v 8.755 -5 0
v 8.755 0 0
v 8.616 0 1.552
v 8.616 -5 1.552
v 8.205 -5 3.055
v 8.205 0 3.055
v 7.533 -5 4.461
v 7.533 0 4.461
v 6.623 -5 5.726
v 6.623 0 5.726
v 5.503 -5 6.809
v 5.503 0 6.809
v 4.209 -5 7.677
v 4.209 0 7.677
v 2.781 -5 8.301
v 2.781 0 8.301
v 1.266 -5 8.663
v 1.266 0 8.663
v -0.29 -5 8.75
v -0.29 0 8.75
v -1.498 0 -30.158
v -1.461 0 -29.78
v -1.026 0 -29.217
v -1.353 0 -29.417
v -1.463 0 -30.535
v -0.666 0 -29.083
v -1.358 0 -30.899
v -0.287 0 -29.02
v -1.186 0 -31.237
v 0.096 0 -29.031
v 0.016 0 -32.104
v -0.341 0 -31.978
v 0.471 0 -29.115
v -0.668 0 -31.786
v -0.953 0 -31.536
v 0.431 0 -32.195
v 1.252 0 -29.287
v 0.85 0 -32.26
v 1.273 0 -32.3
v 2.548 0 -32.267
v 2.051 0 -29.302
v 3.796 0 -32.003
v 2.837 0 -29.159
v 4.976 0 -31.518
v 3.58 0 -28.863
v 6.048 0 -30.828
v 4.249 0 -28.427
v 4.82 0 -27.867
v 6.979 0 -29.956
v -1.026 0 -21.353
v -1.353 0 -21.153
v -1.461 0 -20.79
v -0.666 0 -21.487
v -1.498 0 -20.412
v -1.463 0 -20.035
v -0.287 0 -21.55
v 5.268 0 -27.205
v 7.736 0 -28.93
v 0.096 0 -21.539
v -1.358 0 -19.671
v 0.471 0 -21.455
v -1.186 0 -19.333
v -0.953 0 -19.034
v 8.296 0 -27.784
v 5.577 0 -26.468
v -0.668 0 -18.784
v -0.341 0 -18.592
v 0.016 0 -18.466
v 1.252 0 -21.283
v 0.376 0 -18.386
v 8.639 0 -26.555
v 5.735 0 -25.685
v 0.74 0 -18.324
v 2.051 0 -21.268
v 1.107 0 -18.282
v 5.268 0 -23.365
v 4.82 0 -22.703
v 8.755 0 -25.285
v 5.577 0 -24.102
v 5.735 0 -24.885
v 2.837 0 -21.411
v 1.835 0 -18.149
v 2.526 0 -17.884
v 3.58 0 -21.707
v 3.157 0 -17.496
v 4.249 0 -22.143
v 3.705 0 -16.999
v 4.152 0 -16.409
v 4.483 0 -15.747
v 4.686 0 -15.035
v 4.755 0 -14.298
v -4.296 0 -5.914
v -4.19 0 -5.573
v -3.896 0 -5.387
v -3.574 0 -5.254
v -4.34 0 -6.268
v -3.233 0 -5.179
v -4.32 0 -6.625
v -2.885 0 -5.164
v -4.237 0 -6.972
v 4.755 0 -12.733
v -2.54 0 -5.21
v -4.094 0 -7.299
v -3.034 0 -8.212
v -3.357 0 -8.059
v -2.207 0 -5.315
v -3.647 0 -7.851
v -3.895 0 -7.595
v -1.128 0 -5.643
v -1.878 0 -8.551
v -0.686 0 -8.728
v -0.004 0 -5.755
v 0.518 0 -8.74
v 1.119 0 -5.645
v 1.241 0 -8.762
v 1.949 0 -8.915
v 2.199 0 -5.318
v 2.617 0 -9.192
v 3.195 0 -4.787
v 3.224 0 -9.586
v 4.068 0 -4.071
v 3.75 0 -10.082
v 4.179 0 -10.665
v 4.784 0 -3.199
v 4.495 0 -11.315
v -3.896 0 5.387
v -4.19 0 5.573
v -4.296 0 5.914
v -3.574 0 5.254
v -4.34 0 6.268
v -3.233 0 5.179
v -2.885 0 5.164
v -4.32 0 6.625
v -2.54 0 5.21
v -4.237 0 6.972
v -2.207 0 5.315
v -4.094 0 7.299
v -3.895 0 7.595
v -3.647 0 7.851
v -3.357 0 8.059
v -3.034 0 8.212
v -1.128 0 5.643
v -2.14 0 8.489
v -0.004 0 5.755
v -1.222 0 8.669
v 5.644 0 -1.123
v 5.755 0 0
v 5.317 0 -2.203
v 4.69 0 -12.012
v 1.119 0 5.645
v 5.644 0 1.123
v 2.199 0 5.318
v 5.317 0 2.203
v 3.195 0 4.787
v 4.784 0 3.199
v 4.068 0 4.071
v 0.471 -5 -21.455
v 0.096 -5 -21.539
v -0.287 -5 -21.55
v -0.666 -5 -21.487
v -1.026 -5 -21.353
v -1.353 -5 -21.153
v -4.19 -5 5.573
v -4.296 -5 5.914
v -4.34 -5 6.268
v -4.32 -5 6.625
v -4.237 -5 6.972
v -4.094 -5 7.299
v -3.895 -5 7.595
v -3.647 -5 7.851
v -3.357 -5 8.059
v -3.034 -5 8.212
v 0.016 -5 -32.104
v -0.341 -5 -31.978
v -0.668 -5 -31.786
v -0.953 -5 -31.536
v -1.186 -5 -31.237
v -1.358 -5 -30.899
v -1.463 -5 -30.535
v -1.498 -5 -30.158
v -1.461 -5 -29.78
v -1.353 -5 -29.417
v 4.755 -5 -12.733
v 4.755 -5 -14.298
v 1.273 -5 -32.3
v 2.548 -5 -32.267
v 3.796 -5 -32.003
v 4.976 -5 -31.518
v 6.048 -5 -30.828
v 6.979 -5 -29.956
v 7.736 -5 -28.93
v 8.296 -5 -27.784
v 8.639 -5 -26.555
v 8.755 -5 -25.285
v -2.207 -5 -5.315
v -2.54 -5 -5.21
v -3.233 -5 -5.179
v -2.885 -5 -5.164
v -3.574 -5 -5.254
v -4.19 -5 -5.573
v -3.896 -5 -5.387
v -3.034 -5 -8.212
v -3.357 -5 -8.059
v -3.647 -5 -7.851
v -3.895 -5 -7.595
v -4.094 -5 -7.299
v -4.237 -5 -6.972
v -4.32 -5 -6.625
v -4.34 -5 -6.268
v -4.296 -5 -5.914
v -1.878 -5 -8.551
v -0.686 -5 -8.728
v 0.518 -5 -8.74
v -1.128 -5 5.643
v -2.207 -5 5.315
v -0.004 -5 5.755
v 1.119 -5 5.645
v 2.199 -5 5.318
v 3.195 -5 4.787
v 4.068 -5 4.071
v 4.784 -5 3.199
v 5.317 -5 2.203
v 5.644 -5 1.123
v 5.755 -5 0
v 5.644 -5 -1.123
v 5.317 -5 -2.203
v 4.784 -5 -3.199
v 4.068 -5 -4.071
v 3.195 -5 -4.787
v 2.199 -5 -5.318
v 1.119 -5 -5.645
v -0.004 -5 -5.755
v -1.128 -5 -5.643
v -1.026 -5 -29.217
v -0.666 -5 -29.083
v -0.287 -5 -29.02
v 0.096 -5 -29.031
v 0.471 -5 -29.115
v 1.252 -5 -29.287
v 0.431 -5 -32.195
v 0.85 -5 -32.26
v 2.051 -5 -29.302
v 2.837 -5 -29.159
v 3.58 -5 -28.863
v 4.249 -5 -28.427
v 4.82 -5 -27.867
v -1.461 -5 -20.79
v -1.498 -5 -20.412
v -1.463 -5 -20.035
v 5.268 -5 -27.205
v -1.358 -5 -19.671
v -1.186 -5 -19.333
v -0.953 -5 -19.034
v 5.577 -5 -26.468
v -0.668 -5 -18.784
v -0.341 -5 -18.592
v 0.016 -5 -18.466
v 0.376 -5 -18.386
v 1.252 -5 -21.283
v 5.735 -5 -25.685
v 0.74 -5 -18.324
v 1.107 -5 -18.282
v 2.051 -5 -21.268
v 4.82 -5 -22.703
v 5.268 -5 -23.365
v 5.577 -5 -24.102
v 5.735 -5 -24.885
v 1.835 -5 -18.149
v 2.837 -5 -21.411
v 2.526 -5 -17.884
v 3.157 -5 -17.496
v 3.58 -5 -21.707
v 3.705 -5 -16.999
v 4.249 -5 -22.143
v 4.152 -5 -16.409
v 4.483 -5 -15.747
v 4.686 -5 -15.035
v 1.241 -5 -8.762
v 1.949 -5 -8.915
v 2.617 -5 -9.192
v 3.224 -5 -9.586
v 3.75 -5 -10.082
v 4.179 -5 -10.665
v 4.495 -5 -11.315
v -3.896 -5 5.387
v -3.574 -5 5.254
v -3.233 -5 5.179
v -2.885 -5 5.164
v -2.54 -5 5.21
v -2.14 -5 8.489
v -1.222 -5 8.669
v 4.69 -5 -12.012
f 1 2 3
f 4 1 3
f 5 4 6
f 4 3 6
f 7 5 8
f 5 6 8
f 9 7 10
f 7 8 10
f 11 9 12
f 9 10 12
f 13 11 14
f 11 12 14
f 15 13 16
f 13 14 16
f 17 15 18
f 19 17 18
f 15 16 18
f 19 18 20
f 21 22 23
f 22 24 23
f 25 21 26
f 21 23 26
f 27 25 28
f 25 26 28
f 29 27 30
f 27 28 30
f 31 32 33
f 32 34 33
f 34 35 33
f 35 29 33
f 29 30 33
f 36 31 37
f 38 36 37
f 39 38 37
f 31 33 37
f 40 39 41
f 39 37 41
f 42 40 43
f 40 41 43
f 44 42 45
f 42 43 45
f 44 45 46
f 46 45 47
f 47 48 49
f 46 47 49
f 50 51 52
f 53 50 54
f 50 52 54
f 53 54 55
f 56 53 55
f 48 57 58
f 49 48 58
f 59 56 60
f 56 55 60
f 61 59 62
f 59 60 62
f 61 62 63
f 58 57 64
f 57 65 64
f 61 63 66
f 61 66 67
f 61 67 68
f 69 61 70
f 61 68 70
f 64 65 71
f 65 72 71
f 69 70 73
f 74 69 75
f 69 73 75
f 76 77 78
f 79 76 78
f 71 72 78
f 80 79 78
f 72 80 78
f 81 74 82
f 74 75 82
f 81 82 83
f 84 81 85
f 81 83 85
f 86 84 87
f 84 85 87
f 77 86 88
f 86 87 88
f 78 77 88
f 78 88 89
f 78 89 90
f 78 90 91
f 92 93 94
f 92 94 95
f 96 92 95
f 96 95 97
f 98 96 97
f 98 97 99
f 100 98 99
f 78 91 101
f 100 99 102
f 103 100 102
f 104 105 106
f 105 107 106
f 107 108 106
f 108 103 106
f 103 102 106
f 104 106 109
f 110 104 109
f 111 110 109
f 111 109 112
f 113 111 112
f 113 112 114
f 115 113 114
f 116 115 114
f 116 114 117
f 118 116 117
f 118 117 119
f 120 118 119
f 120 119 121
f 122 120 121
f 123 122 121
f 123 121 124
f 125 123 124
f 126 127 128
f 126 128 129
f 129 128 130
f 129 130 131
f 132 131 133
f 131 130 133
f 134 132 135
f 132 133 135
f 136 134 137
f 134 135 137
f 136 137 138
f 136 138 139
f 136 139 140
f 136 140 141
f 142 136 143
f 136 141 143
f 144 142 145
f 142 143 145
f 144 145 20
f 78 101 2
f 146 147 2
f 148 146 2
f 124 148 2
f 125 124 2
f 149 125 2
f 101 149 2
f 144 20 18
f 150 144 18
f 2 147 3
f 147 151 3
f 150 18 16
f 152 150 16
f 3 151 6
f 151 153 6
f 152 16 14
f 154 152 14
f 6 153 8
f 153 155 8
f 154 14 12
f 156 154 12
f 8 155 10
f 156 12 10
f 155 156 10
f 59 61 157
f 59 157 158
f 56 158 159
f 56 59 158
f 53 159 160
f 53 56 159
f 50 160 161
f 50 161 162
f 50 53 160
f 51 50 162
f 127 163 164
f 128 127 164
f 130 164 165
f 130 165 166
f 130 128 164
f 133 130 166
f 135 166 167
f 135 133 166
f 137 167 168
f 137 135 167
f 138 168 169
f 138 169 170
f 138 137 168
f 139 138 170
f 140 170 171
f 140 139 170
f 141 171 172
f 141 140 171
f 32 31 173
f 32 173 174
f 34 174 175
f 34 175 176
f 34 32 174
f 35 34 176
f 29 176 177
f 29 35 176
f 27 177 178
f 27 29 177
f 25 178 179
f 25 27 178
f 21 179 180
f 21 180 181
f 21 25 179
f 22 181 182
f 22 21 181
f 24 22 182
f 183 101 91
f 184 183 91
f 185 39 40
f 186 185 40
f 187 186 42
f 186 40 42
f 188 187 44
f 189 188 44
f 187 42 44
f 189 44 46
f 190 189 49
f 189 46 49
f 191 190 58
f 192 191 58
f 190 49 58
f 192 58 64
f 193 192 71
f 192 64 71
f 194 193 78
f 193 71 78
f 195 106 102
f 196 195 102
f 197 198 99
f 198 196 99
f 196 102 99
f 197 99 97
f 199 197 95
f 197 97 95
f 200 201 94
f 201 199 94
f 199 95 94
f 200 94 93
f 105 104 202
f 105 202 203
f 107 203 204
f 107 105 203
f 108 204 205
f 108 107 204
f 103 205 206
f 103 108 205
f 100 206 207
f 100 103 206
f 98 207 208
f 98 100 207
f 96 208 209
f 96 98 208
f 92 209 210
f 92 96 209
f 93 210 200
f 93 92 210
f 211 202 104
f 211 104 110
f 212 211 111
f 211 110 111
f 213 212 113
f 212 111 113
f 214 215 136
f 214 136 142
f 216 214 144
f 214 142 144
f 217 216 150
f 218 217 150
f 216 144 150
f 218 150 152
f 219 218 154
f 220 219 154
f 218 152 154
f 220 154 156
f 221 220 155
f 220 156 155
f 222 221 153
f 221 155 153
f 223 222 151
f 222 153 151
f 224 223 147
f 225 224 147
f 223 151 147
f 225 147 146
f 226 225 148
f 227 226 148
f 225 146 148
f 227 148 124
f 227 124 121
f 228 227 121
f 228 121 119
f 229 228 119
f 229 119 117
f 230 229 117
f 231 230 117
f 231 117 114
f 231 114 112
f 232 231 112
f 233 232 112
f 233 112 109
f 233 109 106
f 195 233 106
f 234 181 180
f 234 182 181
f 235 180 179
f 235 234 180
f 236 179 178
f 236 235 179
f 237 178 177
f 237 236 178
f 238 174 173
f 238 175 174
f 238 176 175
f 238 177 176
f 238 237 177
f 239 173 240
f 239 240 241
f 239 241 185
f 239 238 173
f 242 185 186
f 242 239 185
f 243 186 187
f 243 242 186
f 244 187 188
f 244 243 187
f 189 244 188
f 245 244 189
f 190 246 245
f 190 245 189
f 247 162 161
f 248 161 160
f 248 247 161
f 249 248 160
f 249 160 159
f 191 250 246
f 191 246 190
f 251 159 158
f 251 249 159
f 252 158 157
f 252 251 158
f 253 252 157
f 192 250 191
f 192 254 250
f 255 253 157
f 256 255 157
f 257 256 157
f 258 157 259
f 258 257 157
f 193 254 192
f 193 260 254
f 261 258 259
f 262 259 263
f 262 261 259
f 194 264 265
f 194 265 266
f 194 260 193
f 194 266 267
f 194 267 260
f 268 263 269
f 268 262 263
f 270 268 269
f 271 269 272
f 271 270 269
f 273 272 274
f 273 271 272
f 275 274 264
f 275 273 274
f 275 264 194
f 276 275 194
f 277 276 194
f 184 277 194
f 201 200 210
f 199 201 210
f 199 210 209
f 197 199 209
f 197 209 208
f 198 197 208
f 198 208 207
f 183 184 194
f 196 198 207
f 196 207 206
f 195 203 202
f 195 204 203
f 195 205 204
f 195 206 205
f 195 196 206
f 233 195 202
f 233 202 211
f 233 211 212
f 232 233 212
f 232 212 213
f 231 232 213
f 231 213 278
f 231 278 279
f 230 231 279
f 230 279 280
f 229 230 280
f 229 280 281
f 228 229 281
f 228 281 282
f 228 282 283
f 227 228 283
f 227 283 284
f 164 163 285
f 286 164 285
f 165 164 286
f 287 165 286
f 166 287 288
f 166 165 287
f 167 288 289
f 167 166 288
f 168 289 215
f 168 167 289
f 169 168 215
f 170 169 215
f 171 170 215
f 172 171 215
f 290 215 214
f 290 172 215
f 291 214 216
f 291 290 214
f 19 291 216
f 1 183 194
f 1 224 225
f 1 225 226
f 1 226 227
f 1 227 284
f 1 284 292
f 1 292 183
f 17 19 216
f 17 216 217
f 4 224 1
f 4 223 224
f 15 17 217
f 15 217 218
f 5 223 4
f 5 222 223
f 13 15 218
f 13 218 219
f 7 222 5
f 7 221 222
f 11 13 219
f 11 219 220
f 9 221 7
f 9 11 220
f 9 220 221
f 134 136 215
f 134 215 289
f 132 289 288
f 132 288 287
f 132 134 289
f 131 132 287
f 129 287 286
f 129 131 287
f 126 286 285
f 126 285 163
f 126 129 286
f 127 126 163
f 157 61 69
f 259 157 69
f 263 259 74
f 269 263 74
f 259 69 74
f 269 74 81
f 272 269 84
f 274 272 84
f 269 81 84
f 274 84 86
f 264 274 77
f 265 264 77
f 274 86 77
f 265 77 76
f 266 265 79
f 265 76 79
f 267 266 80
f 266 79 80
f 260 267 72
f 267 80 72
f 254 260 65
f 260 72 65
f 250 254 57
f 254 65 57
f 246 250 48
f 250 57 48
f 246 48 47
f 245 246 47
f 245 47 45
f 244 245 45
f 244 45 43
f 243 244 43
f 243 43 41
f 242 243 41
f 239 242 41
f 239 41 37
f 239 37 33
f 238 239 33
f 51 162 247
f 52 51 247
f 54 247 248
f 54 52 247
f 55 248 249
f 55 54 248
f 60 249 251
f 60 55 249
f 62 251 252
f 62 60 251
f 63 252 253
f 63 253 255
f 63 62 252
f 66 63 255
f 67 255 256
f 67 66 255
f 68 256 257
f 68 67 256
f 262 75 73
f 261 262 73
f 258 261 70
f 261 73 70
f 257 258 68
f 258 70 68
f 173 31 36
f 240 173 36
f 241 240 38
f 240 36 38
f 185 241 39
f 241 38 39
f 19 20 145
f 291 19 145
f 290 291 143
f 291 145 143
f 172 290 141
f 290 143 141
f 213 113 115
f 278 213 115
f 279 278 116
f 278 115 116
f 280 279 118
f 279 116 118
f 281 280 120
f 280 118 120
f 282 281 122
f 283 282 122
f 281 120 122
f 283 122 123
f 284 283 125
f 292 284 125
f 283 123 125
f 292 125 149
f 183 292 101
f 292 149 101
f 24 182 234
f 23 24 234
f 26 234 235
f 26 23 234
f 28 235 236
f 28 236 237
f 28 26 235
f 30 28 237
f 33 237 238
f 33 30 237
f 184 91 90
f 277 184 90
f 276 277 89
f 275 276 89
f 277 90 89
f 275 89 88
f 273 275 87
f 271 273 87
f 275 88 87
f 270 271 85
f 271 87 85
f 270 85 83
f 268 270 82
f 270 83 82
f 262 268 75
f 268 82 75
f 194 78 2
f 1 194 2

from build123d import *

# Parameters (mm, degrees)
F1_DEPTH    = 5
F2_T1_DEPTH = 18.1085359619
F2_T3_DEPTH = 13.6883237314
F2_T5_DEPTH = 19.2734411819
F2_T7_DEPTH = 13.2933208328


# Not quite as in the source:
# - a fillet or chamfer that OpenCascade refuses, or shapes differently, is made with other operations: its cross-section is extruded or revolved along the edge and cut away or added


with BuildPart() as f1:
    # F0 (on Front) → F1 (new body)
    with BuildSketch(Plane.XZ):
        with BuildLine():
            Line((8.755, -25.285), (8.755, 0))
            ThreePointArc((8.755, 0), (6.0873467679, 6.2923949596), (-0.2899421651, 8.7501976287))
            ThreePointArc((-0.2899421651, 8.7501976287), (-2.9511128894, 8.2426305094), (-5.329706311, 6.9458084942))
            Line((-5.329706311, 6.9458084942), (-3.5034220239, 4.5657484734))
            ThreePointArc((-3.5034220239, 4.5657484734), (5.755, 0), (-3.5034220239, -4.5657484734))
            Line((-3.5034220239, -4.5657484734), (-5.329706311, -6.9458084942))
            ThreePointArc((-5.329706311, -6.9458084942), (-4.2988977903, -7.6268933904), (-3.1824790985, -8.1560929242))
            ThreePointArc((-3.1824790985, -8.1560929242), (-1.3637045363, -8.648140548), (0.5182301058, -8.7396488807))
            ThreePointArc((0.5182301058, -8.7396488807), (3.4984394857, -9.8217007124), (4.755, -12.7326352339))
            Line((4.755, -12.7326352339), (4.755, -14.2977346441))
            ThreePointArc((4.755, -14.2977346441), (3.705175556, -16.9989314509), (1.1067679057, -18.2822370397))
            ThreePointArc((1.1067679057, -18.2822370397), (-0.8255248465, -18.7339906879), (-2.5545928459, -19.7077260178))
            Line((-2.5545928459, -19.7077260178), (-0.7283085589, -22.0877860386))
            ThreePointArc((-0.7283085589, -22.0877860386), (5.755, -25.285), (-0.7283085589, -28.4822139614))
            Line((-0.7283085589, -28.4822139614), (-2.5545928459, -30.8622739822))
            ThreePointArc((-2.5545928459, -30.8622739822), (-0.7476906173, -31.8657827127), (1.2729501298, -32.3004508704))
            ThreePointArc((1.2729501298, -32.3004508704), (6.5334815385, -30.4132945795), (8.755, -25.285))
        make_face()
    extrude(amount=F1_DEPTH)

    # F2: fillet of radius 2 on 8 edges, made by hand

    # F2_s2 → F2_t1 (cut)
    with BuildSketch(Plane.XZ.offset(-6.554267981)):
        with BuildLine():
            ThreePointArc((-3.9278099293, 5.1188215596), (-4.2625544155, 6.8913447905), (-3.0342500285, 8.2123901371))
            ThreePointArc((-3.0342500285, 8.2123901371), (-4.2296570401, 7.6655088757), (-5.329706311, 6.9458084942))
            Line((-5.329706311, 6.9458084942), (-3.9278099293, 5.1188215596))
        make_face()
        with BuildLine():
            ThreePointArc((-3.0342500285, -8.2123901371), (-4.2625544155, -6.8913447905), (-3.9278099293, -5.1188215596))
            Line((-3.9278099293, -5.1188215596), (-5.329706311, -6.9458084942))
            ThreePointArc((-5.329706311, -6.9458084942), (-4.2296570401, -7.6655088757), (-3.0342500285, -8.2123901371))
        make_face()
    extrude(amount=F2_T1_DEPTH, mode=Mode.SUBTRACT)

    # F2_s4 → F2_t3 (cut)
    with BuildSketch(Plane.XZ.offset(-4.3441618657)):
        with BuildLine():
            ThreePointArc((-2.2074106697, 5.3148248452), (-3.4912558515, 5.2297553021), (-4.561245298, 5.9443306041))
            Line((-4.561245298, 5.9443306041), (-3.5034220239, 4.5657484734))
            ThreePointArc((-3.5034220239, 4.5657484734), (-2.8798752345, 4.9826041016), (-2.2074106697, 5.3148248452))
        make_face()
        with BuildLine():
            ThreePointArc((-2.2074106697, -5.3148248452), (-3.4912558515, -5.2297553021), (-4.561245298, -5.9443306041))
            Line((-4.561245298, -5.9443306041), (-3.5034220239, -4.5657484734))
            ThreePointArc((-3.5034220239, -4.5657484734), (-2.8798752345, -4.9826041016), (-2.2074106697, -5.3148248452))
        make_face()
    extrude(amount=F2_T3_DEPTH, mode=Mode.SUBTRACT)

    # F2_s6 → F2_t5 (cut)
    with BuildSketch(Plane.XZ.offset(-7.1367205909)):
        with BuildLine():
            ThreePointArc((0.0158522318, -32.1040698711), (-1.3864892611, -30.8222917209), (-1.084610418, -28.9465555846))
            Line((-1.084610418, -28.9465555846), (-2.5545928459, -30.8622739822))
            ThreePointArc((-2.5545928459, -30.8622739822), (-1.3330660217, -31.6150183417), (0.0158522318, -32.1040698711))
        make_face()
        with BuildLine():
            ThreePointArc((-1.084610418, -21.6234444154), (-1.3864892611, -19.7477082791), (0.0158522318, -18.4659301289))
            ThreePointArc((0.0158522318, -18.4659301289), (-1.3330660217, -18.9549816583), (-2.5545928459, -19.7077260178))
            Line((-2.5545928459, -19.7077260178), (-1.084610418, -21.6234444154))
        make_face()
    extrude(amount=F2_T5_DEPTH, mode=Mode.SUBTRACT)

    # F2_s8 → F2_t7 (cut)
    with BuildSketch(Plane.XZ.offset(-4.1466604164)):
        with BuildLine():
            ThreePointArc((0.4709999062, -21.4550673942), (-0.7422563844, -21.46506549), (-1.7380393272, -20.7718792817))
            Line((-1.7380393272, -20.7718792817), (-0.7283085589, -22.0877860386))
            ThreePointArc((-0.7283085589, -22.0877860386), (-0.1554567483, -21.7206231375), (0.4709999062, -21.4550673942))
        make_face()
        with BuildLine():
            ThreePointArc((-1.7380393272, -29.7981207183), (-0.7422563844, -29.10493451), (0.4709999062, -29.1149326058))
            ThreePointArc((0.4709999062, -29.1149326058), (-0.1554567483, -28.8493768625), (-0.7283085589, -28.4822139614))
            Line((-0.7283085589, -28.4822139614), (-1.7380393272, -29.7981207183))
        make_face()
    extrude(amount=F2_T7_DEPTH, mode=Mode.SUBTRACT)


solid = f1.part
